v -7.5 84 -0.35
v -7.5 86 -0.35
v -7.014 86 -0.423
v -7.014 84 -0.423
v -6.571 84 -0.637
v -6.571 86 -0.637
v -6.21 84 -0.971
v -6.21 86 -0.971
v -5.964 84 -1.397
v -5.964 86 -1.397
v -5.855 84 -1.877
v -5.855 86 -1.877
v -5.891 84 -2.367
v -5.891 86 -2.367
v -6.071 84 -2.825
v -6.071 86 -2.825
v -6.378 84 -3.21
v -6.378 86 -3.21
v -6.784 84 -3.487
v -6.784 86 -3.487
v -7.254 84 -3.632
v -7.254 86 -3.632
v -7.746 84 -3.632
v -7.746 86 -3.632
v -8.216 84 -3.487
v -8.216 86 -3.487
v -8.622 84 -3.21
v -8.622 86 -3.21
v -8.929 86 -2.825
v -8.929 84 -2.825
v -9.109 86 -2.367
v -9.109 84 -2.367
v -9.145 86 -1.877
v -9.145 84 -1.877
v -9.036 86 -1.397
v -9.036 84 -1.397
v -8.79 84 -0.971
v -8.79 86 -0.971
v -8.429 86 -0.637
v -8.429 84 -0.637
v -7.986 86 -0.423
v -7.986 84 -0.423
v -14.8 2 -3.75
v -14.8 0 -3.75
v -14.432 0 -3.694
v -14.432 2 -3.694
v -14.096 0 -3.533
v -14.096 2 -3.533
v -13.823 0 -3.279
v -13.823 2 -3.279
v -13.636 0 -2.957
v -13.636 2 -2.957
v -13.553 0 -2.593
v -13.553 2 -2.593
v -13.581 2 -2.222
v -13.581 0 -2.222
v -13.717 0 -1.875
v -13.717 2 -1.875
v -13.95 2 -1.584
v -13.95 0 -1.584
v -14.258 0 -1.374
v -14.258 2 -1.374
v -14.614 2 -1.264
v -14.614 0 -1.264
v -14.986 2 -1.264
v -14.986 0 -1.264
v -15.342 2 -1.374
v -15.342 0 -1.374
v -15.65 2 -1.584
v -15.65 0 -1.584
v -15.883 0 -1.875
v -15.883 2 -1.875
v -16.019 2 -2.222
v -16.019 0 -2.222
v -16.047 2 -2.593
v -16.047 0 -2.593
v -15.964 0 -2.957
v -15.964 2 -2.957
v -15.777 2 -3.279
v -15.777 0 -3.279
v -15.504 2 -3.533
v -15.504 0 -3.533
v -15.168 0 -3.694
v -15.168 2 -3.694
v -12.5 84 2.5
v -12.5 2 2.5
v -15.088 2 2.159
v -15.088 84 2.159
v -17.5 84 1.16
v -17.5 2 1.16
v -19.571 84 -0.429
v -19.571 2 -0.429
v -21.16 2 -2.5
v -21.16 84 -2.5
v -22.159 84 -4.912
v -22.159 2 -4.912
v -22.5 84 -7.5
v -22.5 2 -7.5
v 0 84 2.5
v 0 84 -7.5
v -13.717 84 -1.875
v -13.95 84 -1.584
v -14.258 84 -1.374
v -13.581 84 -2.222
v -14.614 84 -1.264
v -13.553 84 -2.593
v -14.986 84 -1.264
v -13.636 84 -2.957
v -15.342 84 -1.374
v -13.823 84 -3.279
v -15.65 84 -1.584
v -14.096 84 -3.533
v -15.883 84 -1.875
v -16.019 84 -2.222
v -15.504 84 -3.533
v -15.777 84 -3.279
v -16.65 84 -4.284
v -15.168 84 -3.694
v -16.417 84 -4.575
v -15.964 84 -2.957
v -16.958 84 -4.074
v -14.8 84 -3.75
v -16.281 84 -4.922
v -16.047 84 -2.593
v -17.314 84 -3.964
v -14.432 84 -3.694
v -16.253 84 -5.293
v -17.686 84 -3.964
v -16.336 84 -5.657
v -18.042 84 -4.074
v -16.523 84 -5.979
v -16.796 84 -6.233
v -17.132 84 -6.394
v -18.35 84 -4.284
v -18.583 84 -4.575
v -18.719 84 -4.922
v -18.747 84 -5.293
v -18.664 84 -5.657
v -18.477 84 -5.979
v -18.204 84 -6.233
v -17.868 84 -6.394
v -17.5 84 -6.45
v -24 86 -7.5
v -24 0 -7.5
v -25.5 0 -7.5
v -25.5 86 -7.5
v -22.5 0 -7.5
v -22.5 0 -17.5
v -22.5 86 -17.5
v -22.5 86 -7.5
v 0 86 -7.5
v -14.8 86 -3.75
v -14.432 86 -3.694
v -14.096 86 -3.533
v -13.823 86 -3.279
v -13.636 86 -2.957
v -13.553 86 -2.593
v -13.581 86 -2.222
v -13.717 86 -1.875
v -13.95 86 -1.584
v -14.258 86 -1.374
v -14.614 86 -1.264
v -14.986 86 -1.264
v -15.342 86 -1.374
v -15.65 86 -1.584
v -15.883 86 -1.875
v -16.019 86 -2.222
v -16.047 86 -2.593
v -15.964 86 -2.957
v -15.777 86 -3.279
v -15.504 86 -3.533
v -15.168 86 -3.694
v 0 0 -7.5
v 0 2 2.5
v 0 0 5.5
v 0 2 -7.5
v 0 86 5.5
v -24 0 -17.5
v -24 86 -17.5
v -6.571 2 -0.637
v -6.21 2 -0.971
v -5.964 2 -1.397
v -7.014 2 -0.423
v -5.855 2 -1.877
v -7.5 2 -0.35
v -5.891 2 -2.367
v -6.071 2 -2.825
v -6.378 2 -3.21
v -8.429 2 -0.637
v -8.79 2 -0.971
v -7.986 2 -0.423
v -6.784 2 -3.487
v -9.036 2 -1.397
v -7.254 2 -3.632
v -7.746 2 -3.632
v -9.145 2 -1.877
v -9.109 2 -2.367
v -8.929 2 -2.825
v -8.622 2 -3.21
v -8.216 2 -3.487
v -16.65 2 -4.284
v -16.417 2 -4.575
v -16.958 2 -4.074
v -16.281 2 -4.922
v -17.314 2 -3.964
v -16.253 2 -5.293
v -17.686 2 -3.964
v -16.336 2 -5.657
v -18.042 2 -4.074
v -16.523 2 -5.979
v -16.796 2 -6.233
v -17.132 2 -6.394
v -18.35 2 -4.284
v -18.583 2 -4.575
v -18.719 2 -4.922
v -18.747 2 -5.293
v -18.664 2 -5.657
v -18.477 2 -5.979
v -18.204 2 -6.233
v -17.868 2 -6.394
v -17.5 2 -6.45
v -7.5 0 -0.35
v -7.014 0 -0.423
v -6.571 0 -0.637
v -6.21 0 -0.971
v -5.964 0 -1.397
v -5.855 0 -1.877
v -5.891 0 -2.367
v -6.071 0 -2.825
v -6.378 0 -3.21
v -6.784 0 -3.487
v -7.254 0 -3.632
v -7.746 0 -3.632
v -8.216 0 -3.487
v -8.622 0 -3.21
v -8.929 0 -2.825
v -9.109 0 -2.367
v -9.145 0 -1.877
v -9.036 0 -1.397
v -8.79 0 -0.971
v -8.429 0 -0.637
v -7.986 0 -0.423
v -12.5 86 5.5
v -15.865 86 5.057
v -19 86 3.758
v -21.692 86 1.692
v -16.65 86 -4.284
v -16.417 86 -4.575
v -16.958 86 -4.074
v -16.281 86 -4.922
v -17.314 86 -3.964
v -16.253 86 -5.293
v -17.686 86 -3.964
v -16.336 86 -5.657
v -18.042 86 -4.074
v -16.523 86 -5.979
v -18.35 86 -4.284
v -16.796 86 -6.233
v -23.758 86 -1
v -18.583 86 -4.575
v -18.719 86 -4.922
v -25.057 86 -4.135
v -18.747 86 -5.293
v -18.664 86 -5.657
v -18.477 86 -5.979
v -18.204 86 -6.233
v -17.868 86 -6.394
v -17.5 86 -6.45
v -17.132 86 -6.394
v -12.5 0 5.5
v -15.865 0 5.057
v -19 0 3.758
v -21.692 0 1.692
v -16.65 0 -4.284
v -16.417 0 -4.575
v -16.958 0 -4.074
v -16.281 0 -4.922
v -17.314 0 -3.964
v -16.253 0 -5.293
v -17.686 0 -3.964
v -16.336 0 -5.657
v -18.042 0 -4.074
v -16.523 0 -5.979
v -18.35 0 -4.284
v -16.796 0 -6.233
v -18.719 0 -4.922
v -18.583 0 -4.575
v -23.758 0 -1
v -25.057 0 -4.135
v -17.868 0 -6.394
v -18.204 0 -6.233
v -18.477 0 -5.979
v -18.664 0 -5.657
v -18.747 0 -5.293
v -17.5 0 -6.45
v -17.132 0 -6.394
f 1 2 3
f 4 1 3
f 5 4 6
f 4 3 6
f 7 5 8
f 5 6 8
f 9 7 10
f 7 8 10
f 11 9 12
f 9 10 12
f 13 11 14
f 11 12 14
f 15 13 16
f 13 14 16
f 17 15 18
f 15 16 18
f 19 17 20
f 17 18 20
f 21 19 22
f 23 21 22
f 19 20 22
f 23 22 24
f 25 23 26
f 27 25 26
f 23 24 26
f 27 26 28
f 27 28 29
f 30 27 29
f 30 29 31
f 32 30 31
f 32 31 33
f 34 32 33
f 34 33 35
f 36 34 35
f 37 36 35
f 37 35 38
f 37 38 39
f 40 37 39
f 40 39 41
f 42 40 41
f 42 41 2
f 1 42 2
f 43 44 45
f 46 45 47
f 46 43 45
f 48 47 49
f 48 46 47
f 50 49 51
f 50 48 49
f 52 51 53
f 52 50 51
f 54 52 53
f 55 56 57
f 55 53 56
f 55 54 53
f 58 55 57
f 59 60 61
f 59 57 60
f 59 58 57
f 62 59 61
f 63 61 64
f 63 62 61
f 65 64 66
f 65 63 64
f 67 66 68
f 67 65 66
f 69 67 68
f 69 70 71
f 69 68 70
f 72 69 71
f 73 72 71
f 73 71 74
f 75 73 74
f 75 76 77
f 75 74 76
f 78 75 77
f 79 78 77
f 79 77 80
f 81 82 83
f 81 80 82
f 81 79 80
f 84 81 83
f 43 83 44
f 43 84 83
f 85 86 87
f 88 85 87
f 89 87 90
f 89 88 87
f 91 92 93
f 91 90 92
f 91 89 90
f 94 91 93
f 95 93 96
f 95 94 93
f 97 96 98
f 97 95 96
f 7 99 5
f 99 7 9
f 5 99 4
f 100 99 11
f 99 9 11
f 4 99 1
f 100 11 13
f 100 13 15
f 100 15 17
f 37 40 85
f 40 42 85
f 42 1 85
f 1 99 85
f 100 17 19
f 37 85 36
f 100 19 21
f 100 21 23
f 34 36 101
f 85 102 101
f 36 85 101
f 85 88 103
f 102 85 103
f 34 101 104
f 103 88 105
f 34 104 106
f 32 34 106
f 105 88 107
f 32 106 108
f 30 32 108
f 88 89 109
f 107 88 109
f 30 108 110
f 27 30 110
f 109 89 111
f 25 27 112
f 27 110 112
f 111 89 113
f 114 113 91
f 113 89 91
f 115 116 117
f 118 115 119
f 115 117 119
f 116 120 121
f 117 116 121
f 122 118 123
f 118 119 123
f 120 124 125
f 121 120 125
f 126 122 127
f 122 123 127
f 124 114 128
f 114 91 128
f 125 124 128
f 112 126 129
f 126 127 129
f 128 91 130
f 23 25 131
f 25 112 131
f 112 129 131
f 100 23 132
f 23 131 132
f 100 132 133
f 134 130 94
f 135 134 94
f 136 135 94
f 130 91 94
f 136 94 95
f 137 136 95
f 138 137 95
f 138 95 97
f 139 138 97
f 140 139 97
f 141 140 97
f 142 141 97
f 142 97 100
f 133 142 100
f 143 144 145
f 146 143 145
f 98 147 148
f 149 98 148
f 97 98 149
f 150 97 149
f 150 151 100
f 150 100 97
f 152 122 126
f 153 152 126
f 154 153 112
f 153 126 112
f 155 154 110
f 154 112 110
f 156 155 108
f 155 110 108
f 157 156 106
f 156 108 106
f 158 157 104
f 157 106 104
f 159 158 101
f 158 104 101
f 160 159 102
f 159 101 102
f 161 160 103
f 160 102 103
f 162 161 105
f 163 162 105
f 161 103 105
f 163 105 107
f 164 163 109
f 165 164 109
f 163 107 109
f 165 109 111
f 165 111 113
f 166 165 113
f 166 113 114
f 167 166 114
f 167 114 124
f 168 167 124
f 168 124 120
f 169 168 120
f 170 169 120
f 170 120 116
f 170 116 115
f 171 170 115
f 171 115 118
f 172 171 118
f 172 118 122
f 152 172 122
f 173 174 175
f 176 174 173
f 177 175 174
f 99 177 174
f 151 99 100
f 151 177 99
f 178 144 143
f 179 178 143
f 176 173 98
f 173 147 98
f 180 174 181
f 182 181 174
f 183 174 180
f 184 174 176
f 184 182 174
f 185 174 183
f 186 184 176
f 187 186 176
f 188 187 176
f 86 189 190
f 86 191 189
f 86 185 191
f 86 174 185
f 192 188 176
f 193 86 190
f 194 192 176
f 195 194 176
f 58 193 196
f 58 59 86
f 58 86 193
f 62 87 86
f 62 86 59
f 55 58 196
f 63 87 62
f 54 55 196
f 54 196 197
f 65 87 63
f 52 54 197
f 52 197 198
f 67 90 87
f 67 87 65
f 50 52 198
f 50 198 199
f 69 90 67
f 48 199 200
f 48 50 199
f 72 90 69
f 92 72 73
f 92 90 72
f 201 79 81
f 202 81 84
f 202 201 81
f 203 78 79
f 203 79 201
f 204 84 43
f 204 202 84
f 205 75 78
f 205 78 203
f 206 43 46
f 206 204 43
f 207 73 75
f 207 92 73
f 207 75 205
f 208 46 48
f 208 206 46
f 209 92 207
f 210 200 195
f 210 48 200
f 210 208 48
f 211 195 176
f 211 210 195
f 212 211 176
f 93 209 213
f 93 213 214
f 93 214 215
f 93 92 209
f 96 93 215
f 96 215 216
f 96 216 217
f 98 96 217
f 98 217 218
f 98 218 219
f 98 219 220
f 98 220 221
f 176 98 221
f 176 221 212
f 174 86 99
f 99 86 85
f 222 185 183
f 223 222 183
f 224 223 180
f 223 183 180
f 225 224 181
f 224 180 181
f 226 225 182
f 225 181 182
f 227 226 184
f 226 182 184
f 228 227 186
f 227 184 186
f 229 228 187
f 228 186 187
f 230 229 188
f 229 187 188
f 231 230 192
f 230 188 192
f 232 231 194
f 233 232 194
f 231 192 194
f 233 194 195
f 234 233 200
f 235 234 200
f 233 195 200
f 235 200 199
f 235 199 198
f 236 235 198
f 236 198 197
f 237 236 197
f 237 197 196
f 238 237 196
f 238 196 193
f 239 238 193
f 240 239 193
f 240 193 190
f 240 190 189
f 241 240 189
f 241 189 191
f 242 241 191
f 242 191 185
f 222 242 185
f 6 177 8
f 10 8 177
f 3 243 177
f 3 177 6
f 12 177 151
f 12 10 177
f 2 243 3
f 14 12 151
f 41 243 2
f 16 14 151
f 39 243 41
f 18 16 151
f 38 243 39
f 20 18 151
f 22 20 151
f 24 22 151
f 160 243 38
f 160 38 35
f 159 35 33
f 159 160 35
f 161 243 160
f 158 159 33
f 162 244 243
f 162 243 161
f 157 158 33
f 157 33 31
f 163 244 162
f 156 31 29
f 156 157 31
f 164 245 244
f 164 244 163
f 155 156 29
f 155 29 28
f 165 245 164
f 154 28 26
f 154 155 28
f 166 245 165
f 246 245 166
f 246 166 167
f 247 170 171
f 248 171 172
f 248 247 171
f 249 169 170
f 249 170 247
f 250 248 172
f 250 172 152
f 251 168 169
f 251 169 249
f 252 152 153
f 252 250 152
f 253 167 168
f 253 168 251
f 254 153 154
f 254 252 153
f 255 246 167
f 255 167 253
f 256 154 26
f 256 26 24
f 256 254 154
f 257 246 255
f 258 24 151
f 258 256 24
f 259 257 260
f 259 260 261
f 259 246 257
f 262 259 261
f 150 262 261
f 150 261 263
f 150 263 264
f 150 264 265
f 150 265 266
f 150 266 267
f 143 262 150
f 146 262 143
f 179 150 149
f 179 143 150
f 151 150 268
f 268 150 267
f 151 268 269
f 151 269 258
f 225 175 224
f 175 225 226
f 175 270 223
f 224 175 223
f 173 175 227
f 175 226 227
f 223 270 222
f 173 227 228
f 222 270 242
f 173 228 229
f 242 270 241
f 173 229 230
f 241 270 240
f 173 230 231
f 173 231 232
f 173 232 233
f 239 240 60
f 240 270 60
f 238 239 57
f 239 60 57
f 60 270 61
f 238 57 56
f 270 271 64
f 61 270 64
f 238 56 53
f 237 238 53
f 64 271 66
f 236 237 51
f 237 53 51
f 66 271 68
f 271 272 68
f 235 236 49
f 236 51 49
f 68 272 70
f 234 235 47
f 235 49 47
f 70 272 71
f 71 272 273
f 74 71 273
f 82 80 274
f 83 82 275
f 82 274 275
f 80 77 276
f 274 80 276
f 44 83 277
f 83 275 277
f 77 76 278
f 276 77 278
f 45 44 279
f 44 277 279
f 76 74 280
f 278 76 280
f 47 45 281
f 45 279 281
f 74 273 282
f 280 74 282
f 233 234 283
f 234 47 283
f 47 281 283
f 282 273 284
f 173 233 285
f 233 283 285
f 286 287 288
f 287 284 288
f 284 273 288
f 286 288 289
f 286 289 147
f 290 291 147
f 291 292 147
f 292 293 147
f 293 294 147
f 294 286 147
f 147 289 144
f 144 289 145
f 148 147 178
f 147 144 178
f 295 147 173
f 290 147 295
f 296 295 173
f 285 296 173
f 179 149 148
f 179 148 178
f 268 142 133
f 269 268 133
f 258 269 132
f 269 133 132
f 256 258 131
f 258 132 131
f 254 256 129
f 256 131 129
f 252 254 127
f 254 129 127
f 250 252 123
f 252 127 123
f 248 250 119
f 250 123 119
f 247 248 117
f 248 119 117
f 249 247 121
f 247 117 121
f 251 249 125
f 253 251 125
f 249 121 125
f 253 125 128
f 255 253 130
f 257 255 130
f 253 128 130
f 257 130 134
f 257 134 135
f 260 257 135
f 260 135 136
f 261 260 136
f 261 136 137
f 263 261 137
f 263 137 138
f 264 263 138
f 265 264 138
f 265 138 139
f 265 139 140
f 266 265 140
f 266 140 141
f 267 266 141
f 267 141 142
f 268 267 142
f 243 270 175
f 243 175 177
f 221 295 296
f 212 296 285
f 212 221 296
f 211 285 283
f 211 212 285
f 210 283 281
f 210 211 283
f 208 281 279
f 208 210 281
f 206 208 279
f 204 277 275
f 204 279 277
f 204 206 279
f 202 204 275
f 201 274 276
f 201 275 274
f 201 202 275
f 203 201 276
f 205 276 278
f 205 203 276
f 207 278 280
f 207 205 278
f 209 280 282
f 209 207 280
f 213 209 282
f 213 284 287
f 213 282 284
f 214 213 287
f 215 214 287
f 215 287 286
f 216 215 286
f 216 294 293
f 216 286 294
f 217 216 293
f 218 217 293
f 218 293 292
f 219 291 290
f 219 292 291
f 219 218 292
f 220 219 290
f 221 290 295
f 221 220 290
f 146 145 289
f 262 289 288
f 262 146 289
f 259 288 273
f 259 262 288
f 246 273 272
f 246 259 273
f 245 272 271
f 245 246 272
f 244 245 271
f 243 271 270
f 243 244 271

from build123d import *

# Parameters (mm, degrees)
SKETCH_1_W                  = 30
SKETCH_1_H                  = 11
EXTRUDE_1_DEPTH             = 6
SKETCH_2_W                  = 16
SKETCH_2_H                  = 2
CUT_EXTRUDE_1_DEPTH         = 144
EXTRUDE_2_DEPTH             = 80
SKETCH_4_R                  = 1.75
CUT_EXTRUDE_2_DEPTH         = 144
SKETCH_5_W                  = 11
SKETCH_5_H                  = 86
CUT_EXTRUDE_3_DEPTH         = 2.5
EXTRUDE_3_REACH             = 83.58
EXTRUDE_3_DIRECTION_2_REACH = 83.58
SKETCH_7_W                  = 1.5
SKETCH_7_H                  = 86
EXTRUDE_4_DEPTH             = 10
CUT_EXTRUDE_4_DEPTH         = 40
EXTRUDE_5_DEPTH             = 2
SKETCH_10_R                 = 1.25
CUT_EXTRUDE_5_DEPTH         = 3
SKETCH_11_W                 = 3
SKETCH_11_H                 = 86
EXTRUDE_6_DEPTH             = 12.5
SKETCH_12_W                 = 10
SKETCH_12_H                 = 2
EXTRUDE_7_DEPTH             = 12.5
SKETCH_13_R                 = 1.65
CUT_EXTRUDE_6_DEPTH         = 100


with BuildPart() as part:
    # 草图1 → 凸台-拉伸1 (new body)
    with BuildSketch(Plane(origin=(0, 0, 0), x_dir=(1, 0, 0), z_dir=(0, 1, 0))):
        Rectangle(SKETCH_1_W, SKETCH_1_H)
    extrude(amount=EXTRUDE_1_DEPTH)

    # 草图2 → 切除-拉伸1 (cut)
    with BuildSketch(Plane.ZY.offset(15)):
        with Locations((-5.5, 3)):
            Rectangle(SKETCH_2_W, SKETCH_2_H)
    extrude(amount=-CUT_EXTRUDE_1_DEPTH, mode=Mode.SUBTRACT)

    # 草图3 → 凸台-拉伸2 (add)
    with BuildSketch(Plane(origin=(0, 6, 0), x_dir=(1, 0, 0), z_dir=(0, 1, 0))):
        Polygon((2, 5.5), (-2, 5.5), (-2, -3.5), (-15, -3.5), (-15, -5.5), (15, -5.5), (15, -3.5), (2, -3.5), align=None)
    extrude(amount=EXTRUDE_2_DEPTH)

    # 草图4 → 切除-拉伸2 (cut)
    with BuildSketch(Plane(origin=(0, 6, 0), x_dir=(1, 0, 0), z_dir=(0, 1, 0))):
        with Locations(Location((-7.5, 2, 0), (0, 0, 270))):
            Circle(SKETCH_4_R)
        with Locations(Location((7.5, 2, 0), (0, 0, 270))):
            Circle(SKETCH_4_R)
    extrude(amount=-CUT_EXTRUDE_2_DEPTH, mode=Mode.SUBTRACT)

    # 草图5 → 切除-拉伸3 (cut)
    with BuildSketch(Plane.ZY.offset(15)):
        with Locations((0, 43)):
            Rectangle(SKETCH_5_W, SKETCH_5_H)
    extrude(amount=-CUT_EXTRUDE_3_DEPTH, mode=Mode.SUBTRACT)

    # 凸台-拉伸3: up to this face of the body (flat: up to its plane)
    extrude_3_end = Plane(part.part.faces().sort_by_distance((0.755494505, 86, 2.324175824))[0])
    # 草图6 → 凸台-拉伸3 (add, up to the picked face)
    with BuildSketch(Plane(origin=(0, 6, 0), x_dir=(1, 0, 0), z_dir=(0, 1, 0)), mode=Mode.PRIVATE) as extrude_3_sk1:
        with BuildLine():
            Line((-22.5, 7.5), (-25.5, 7.5))
            ThreePointArc((-25.5, 7.5), (-21.692388155, -1.692388155), (-12.5, -5.5))
            Line((-12.5, -5.5), (-12.5, -2.5))
            ThreePointArc((-12.5, -2.5), (-19.571067812, 0.428932188), (-22.5, 7.5))
        make_face()
    extrude_3_tool1 = split(extrude(extrude_3_sk1.sketch, amount=EXTRUDE_3_REACH, mode=Mode.PRIVATE), bisect_by=extrude_3_end, keep=Keep.BOTH, mode=Mode.PRIVATE)
    add(extrude_3_tool1.solids().sort_by(Axis((-19.862646, 6, -0.137354), (0, 1, 0)))[0])

    # 凸台-拉伸3 direction 2: up to this face of the body (flat: up to its plane)
    extrude_3_direction_2_end = Plane(part.part.faces().sort_by_distance((1.334914955, 0, 0.135863928))[0])
    # 草图6 → 凸台-拉伸3 direction 2 (add, up to the picked face)
    with BuildSketch(Plane(origin=(0, 6, 0), x_dir=(1, 0, 0), z_dir=(0, 1, 0)), mode=Mode.PRIVATE) as extrude_3_direction_2_sk1:
        with BuildLine():
            Line((-22.5, 7.5), (-25.5, 7.5))
            ThreePointArc((-25.5, 7.5), (-21.692388155, -1.692388155), (-12.5, -5.5))
            Line((-12.5, -5.5), (-12.5, -2.5))
            ThreePointArc((-12.5, -2.5), (-19.571067812, 0.428932188), (-22.5, 7.5))
        make_face()
    extrude_3_direction_2_tool1 = split(extrude(extrude_3_direction_2_sk1.sketch, amount=-EXTRUDE_3_DIRECTION_2_REACH, mode=Mode.PRIVATE), bisect_by=extrude_3_direction_2_end, keep=Keep.BOTH, mode=Mode.PRIVATE)
    add(extrude_3_direction_2_tool1.solids().sort_by(Axis((-19.862646, 6, -0.137354), (0, -1, 0)))[0])

    # 草图7 → 凸台-拉伸4 (add)
    with BuildSketch(Plane(origin=(0, 0, -7.5), x_dir=(-1, 0, 0), z_dir=(0, 0, -1))):
        with Locations((23.25, 43)):
            Rectangle(SKETCH_7_W, SKETCH_7_H)
    extrude(amount=EXTRUDE_4_DEPTH)

    # 草图8 → 切除-拉伸4 (cut)
    with BuildSketch(Plane(origin=(-12.5, 0, 0), x_dir=(0, 0, -1), z_dir=(1, 0, 0))):
        Polygon((26.892505746, 86), (-2.5, 86), (-2.5, 6), (-2.5, -9.514717226), (26.892505746, -9.514717226), align=None)
        Polygon((-3.5, 6), (-3.5, 86), (-26.700940199, 86), (-26.700940199, -9.514717226), (-2.5, -9.514717226), (-2.5, 6), align=None)
    extrude(amount=CUT_EXTRUDE_4_DEPTH, mode=Mode.SUBTRACT)


with BuildPart() as cut_extrude_4_kept_piece:
    # of the separate pieces the step leaves, the one the design keeps (cut_extrude_4_pieces_kept)
    add(part.part.solids().sort_by_distance((-22.5, 0, -7.5))[0])

    # 草图9 → 凸台-拉伸5 (add)
    with BuildSketch(Plane(origin=(0, 86, 0), x_dir=(1, 0, 0), z_dir=(0, 1, 0))):
        with BuildLine():
            Line((-12.5, -2.5), (-12.5, 7.5))
            Line((-12.5, 7.5), (-22.5, 7.5))
            ThreePointArc((-22.5, 7.5), (-19.571067812, 0.428932188), (-12.5, -2.5))
        make_face()
    extrude_5 = extrude(amount=-EXTRUDE_5_DEPTH)

    # 草图10 → 切除-拉伸5 (cut)
    with BuildSketch(Plane(origin=(0, 84, 0), x_dir=(-1, 0, 0), z_dir=(0, -1, 0))):
        with Locations(Location((14.8, 2.5, 0), (0, 0, 90))):
            Circle(SKETCH_10_R)
        with Locations(Location((17.5, 5.2, 0), (0, 0, 90))):
            Circle(SKETCH_10_R)
    cut_extrude_5 = extrude(amount=-CUT_EXTRUDE_5_DEPTH, mode=Mode.SUBTRACT)

    # 镜向2: 凸台-拉伸5, 切除-拉伸5 across plane
    add(extrude_5.mirror(Plane(origin=(0, 43, 0), x_dir=(0, 0, 1), z_dir=(0, -1, 0))))
    add(cut_extrude_5.mirror(Plane(origin=(0, 43, 0), x_dir=(0, 0, 1), z_dir=(0, -1, 0))), mode=Mode.SUBTRACT)

    # 草图11 → 凸台-拉伸6 (add)
    with BuildSketch(Plane(origin=(-12.5, 0, 0), x_dir=(0, 0, -1), z_dir=(1, 0, 0))):
        with Locations((-4, 43)):
            Rectangle(SKETCH_11_W, SKETCH_11_H)
    extrude(amount=EXTRUDE_6_DEPTH)

    # 草图12 → 凸台-拉伸7 (add)
    with BuildSketch(Plane(origin=(-12.5, 0, 0), x_dir=(0, 0, -1), z_dir=(1, 0, 0))):
        with Locations((2.5, 1)):
            Rectangle(SKETCH_12_W, SKETCH_12_H)
        with Locations((2.5, 85)):
            Rectangle(SKETCH_12_W, SKETCH_12_H)
    extrude(amount=EXTRUDE_7_DEPTH)

    # 草图13 → 切除-拉伸6 (cut)
    with BuildSketch(Plane(origin=(0, 86, 0), x_dir=(1, 0, 0), z_dir=(0, 1, 0))):
        with Locations(Location((-7.5, 2, 0), (0, 0, 270))):
            Circle(SKETCH_13_R)
    extrude(amount=-CUT_EXTRUDE_6_DEPTH, mode=Mode.SUBTRACT)


solid = cut_extrude_4_kept_piece.part
